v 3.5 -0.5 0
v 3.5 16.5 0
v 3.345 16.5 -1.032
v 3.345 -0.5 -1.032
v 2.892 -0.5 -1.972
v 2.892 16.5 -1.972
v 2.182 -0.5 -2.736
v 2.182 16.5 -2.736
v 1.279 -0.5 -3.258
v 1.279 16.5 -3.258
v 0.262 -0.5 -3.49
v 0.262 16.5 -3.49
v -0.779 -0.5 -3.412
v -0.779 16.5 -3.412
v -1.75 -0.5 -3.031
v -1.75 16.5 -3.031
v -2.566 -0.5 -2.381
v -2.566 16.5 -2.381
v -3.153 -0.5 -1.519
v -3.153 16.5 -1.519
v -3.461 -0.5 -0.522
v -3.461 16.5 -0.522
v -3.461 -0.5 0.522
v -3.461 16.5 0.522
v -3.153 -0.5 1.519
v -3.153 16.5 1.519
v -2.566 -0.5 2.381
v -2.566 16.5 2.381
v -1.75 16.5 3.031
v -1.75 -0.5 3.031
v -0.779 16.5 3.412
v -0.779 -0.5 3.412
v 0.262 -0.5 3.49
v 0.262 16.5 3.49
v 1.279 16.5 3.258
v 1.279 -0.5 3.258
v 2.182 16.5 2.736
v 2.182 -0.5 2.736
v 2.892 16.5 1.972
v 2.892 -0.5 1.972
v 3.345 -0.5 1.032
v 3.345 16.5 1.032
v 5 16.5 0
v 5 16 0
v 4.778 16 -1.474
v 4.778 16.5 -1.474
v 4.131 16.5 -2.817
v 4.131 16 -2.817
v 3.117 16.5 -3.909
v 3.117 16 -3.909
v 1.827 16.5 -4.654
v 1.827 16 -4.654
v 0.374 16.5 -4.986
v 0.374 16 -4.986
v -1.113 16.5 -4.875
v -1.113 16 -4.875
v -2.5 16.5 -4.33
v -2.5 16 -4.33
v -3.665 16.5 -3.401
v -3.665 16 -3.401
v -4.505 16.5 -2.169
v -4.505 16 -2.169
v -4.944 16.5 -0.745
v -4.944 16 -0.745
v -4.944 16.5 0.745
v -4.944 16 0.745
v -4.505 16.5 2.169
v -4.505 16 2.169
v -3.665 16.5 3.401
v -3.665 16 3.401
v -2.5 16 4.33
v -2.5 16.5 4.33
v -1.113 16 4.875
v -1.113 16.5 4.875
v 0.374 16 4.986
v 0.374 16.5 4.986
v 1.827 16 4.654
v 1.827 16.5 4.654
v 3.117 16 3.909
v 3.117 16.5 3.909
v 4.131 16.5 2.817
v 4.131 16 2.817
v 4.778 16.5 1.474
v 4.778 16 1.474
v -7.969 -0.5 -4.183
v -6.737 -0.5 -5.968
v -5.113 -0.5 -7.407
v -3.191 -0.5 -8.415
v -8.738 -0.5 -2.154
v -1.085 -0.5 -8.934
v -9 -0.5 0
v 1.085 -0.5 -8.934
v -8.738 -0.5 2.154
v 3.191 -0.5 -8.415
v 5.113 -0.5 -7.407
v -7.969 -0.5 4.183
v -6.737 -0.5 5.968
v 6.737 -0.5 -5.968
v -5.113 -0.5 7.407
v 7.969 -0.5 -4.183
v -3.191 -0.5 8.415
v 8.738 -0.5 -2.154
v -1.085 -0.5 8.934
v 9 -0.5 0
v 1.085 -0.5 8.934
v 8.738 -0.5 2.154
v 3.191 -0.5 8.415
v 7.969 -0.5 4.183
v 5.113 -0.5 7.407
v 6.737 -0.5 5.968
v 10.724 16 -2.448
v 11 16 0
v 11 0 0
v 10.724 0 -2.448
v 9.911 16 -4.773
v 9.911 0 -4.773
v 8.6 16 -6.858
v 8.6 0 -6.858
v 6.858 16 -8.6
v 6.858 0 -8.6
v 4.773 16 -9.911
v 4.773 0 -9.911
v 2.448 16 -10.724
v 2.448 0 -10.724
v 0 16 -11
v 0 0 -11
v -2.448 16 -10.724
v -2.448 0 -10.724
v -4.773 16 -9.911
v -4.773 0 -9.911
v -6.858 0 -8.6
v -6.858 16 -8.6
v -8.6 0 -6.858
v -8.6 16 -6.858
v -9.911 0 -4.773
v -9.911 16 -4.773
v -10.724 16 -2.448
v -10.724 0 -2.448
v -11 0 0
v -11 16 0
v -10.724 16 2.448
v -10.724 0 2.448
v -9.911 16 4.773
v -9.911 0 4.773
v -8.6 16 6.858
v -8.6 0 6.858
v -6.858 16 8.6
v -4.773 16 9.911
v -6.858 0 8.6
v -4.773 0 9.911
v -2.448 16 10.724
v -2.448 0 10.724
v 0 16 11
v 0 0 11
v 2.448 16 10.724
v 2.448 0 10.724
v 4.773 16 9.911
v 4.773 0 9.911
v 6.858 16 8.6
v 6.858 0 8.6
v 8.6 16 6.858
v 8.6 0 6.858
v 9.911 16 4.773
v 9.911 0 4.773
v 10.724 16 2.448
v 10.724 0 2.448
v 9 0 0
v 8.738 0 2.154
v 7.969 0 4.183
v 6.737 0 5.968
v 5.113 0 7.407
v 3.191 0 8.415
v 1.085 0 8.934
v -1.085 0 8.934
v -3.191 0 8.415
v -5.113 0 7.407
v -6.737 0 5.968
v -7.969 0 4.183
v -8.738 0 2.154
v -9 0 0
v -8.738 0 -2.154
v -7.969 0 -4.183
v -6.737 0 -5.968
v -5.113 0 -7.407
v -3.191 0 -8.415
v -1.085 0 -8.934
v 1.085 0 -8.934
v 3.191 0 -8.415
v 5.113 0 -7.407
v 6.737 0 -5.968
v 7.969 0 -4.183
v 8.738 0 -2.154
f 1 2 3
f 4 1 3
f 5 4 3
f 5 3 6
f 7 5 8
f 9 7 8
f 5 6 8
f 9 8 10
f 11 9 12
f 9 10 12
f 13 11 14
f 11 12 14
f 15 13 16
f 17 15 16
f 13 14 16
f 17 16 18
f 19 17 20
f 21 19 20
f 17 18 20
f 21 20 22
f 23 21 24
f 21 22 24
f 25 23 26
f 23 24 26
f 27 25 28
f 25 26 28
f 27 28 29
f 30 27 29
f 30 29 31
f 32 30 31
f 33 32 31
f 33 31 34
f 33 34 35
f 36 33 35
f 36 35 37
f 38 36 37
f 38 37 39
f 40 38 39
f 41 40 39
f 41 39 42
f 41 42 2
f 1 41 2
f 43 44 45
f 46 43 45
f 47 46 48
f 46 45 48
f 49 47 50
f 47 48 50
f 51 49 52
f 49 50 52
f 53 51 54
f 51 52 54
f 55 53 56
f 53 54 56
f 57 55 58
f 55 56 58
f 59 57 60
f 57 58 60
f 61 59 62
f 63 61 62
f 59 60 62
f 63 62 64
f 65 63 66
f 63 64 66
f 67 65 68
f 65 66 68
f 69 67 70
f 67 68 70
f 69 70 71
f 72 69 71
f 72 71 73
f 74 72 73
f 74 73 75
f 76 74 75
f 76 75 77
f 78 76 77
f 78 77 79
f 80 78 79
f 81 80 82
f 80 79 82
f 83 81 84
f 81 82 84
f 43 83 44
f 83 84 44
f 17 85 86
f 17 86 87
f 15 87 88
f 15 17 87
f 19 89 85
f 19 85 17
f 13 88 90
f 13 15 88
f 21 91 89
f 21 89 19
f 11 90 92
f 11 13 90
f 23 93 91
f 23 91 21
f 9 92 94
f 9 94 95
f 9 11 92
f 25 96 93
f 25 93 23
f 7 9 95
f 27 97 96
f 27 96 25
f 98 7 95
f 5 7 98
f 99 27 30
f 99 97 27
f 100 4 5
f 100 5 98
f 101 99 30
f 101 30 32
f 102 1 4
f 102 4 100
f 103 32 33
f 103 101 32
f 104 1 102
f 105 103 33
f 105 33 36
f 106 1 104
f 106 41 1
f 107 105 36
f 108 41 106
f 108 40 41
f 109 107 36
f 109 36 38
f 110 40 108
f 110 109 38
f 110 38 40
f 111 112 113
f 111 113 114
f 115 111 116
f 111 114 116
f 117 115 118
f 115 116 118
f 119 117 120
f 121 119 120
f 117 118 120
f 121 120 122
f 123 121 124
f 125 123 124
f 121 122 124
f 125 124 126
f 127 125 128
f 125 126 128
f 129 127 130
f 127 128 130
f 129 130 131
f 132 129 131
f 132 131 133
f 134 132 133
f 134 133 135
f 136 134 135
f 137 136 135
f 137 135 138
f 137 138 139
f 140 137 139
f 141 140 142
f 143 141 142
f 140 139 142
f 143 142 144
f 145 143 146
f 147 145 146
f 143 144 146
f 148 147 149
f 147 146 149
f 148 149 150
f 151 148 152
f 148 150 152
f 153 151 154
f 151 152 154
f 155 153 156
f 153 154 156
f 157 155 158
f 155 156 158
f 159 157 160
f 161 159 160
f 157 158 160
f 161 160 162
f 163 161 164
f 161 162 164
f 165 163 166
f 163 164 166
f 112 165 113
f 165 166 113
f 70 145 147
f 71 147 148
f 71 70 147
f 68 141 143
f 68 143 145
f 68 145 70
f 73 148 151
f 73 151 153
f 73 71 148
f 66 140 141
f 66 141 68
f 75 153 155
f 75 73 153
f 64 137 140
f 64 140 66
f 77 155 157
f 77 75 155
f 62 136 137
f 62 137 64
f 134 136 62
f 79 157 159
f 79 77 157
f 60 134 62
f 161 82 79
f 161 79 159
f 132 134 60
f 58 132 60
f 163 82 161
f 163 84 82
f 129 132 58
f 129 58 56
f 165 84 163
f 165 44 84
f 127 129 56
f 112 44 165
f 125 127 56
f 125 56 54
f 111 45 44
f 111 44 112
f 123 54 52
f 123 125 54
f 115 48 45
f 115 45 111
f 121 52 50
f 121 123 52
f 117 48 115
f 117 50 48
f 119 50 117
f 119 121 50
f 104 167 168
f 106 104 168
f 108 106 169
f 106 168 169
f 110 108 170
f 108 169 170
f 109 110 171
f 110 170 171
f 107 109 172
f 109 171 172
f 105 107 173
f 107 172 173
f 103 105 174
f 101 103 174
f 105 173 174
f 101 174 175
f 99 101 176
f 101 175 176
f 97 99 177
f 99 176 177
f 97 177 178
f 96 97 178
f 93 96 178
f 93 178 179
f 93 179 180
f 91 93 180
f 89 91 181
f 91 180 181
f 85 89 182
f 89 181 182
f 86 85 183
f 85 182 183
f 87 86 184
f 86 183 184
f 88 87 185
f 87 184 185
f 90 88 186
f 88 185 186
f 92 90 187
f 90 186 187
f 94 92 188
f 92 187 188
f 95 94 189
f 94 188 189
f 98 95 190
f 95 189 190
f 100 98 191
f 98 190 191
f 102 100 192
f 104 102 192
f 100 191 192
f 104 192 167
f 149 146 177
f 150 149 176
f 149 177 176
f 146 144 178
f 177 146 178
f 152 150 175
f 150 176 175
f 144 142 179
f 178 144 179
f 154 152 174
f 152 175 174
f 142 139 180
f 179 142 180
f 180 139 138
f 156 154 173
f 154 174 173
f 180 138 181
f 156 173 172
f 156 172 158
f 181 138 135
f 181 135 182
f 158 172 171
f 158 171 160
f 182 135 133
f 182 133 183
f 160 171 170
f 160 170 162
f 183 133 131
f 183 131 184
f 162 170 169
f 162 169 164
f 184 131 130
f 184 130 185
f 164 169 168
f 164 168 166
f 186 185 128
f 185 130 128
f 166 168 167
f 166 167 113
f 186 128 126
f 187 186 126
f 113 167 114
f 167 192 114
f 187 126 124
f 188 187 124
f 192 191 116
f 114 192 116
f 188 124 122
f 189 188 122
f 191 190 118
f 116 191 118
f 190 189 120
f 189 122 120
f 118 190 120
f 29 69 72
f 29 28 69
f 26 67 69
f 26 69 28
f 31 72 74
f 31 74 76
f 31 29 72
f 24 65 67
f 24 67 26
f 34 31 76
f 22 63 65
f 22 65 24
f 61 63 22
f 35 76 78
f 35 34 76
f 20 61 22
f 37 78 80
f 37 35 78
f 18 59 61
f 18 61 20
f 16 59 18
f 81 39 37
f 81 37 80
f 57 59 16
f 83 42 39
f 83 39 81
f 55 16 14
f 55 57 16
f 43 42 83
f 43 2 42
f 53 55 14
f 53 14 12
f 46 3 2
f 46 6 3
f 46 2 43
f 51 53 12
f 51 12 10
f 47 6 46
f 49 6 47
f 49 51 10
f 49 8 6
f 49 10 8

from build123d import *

# Parameters (mm, degrees)
SKETCH1_R           = 11
BOSS_EXTRUDE1_DEPTH = 16
SKETCH2_R           = 5
BOSS_EXTRUDE2_DEPTH = 0.5
SKETCH3_R           = 9
BOSS_EXTRUDE3_DEPTH = 0.5
SKETCH4_R           = 3.5
CUT_EXTRUDE1_DEPTH  = 18


with BuildPart() as part:
    # Sketch1 → Boss-Extrude1 (new body)
    with BuildSketch(Plane(origin=(0, 0, 0), x_dir=(1, 0, 0), z_dir=(0, 1, 0))):
        Circle(SKETCH1_R)
    extrude(amount=BOSS_EXTRUDE1_DEPTH)

    # Sketch2 → Boss-Extrude2 (add)
    with BuildSketch(Plane(origin=(0, 16, 0), x_dir=(1, 0, 0), z_dir=(0, 1, 0))):
        Circle(SKETCH2_R)
    extrude(amount=BOSS_EXTRUDE2_DEPTH)

    # Sketch3 → Boss-Extrude3 (add)
    with BuildSketch(Plane.XZ):
        Circle(SKETCH3_R)
    extrude(amount=BOSS_EXTRUDE3_DEPTH)

    # Sketch4 → Cut-Extrude1 (cut, through all)
    with BuildSketch(Plane(origin=(0, 16.5, 0), x_dir=(1, 0, 0), z_dir=(0, 1, 0))):
        Circle(SKETCH4_R)
    extrude(amount=-CUT_EXTRUDE1_DEPTH, mode=Mode.SUBTRACT)


solid = part.part
